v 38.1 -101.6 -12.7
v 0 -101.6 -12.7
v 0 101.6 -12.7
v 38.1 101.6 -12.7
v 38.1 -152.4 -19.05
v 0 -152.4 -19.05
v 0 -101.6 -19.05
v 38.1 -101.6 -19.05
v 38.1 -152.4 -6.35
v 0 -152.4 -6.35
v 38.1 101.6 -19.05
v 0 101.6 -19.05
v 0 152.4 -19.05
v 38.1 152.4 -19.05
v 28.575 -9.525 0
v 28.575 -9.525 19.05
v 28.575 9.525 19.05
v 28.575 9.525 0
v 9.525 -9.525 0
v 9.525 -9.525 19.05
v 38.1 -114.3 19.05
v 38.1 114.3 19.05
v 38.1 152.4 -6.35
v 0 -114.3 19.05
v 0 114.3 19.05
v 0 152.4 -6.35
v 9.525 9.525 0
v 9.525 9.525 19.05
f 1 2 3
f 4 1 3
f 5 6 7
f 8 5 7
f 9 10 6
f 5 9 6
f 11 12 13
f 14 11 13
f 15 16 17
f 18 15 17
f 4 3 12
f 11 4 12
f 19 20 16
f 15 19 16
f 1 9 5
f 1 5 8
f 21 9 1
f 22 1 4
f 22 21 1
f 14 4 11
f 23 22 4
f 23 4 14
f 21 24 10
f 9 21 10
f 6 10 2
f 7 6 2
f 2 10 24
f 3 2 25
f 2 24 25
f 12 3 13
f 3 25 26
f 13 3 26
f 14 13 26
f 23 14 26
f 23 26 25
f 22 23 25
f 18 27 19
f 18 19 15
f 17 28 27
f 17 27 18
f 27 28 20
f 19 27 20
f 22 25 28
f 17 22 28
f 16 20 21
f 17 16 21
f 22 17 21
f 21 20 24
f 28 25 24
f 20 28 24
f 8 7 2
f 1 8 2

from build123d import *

# Parameters (mm, degrees)
F1_DEPTH = 38.1
F2_W     = 19.05
F2_H     = 9.525
F3_DEPTH = 19.05


with BuildPart() as f1:
    # F0 (on Right) → F1 (new body)
    with BuildSketch(Plane.YZ):
        Polygon((152.4, -6.35), (114.3, 19.05), (-114.3, 19.05), (-152.4, -6.35), (-152.4, -19.05), (-101.6, -19.05), (-101.6, -12.7), (101.6, -12.7), (101.6, -19.05), (152.4, -19.05), align=None)
    extrude(amount=F1_DEPTH)

    # F2 (on face) → F3 (cut)
    with BuildSketch(Plane.XY.offset(19.05)):
        with Locations((19.05, 4.7625)):
            Rectangle(F2_W, F2_H)
        with Locations((19.05, -4.7625)):
            Rectangle(F2_W, F2_H)
    extrude(amount=-F3_DEPTH, mode=Mode.SUBTRACT)


with BuildPart() as f4_1:
    # F4: copy of F1
    add(f1.part)


solid = f1.part
